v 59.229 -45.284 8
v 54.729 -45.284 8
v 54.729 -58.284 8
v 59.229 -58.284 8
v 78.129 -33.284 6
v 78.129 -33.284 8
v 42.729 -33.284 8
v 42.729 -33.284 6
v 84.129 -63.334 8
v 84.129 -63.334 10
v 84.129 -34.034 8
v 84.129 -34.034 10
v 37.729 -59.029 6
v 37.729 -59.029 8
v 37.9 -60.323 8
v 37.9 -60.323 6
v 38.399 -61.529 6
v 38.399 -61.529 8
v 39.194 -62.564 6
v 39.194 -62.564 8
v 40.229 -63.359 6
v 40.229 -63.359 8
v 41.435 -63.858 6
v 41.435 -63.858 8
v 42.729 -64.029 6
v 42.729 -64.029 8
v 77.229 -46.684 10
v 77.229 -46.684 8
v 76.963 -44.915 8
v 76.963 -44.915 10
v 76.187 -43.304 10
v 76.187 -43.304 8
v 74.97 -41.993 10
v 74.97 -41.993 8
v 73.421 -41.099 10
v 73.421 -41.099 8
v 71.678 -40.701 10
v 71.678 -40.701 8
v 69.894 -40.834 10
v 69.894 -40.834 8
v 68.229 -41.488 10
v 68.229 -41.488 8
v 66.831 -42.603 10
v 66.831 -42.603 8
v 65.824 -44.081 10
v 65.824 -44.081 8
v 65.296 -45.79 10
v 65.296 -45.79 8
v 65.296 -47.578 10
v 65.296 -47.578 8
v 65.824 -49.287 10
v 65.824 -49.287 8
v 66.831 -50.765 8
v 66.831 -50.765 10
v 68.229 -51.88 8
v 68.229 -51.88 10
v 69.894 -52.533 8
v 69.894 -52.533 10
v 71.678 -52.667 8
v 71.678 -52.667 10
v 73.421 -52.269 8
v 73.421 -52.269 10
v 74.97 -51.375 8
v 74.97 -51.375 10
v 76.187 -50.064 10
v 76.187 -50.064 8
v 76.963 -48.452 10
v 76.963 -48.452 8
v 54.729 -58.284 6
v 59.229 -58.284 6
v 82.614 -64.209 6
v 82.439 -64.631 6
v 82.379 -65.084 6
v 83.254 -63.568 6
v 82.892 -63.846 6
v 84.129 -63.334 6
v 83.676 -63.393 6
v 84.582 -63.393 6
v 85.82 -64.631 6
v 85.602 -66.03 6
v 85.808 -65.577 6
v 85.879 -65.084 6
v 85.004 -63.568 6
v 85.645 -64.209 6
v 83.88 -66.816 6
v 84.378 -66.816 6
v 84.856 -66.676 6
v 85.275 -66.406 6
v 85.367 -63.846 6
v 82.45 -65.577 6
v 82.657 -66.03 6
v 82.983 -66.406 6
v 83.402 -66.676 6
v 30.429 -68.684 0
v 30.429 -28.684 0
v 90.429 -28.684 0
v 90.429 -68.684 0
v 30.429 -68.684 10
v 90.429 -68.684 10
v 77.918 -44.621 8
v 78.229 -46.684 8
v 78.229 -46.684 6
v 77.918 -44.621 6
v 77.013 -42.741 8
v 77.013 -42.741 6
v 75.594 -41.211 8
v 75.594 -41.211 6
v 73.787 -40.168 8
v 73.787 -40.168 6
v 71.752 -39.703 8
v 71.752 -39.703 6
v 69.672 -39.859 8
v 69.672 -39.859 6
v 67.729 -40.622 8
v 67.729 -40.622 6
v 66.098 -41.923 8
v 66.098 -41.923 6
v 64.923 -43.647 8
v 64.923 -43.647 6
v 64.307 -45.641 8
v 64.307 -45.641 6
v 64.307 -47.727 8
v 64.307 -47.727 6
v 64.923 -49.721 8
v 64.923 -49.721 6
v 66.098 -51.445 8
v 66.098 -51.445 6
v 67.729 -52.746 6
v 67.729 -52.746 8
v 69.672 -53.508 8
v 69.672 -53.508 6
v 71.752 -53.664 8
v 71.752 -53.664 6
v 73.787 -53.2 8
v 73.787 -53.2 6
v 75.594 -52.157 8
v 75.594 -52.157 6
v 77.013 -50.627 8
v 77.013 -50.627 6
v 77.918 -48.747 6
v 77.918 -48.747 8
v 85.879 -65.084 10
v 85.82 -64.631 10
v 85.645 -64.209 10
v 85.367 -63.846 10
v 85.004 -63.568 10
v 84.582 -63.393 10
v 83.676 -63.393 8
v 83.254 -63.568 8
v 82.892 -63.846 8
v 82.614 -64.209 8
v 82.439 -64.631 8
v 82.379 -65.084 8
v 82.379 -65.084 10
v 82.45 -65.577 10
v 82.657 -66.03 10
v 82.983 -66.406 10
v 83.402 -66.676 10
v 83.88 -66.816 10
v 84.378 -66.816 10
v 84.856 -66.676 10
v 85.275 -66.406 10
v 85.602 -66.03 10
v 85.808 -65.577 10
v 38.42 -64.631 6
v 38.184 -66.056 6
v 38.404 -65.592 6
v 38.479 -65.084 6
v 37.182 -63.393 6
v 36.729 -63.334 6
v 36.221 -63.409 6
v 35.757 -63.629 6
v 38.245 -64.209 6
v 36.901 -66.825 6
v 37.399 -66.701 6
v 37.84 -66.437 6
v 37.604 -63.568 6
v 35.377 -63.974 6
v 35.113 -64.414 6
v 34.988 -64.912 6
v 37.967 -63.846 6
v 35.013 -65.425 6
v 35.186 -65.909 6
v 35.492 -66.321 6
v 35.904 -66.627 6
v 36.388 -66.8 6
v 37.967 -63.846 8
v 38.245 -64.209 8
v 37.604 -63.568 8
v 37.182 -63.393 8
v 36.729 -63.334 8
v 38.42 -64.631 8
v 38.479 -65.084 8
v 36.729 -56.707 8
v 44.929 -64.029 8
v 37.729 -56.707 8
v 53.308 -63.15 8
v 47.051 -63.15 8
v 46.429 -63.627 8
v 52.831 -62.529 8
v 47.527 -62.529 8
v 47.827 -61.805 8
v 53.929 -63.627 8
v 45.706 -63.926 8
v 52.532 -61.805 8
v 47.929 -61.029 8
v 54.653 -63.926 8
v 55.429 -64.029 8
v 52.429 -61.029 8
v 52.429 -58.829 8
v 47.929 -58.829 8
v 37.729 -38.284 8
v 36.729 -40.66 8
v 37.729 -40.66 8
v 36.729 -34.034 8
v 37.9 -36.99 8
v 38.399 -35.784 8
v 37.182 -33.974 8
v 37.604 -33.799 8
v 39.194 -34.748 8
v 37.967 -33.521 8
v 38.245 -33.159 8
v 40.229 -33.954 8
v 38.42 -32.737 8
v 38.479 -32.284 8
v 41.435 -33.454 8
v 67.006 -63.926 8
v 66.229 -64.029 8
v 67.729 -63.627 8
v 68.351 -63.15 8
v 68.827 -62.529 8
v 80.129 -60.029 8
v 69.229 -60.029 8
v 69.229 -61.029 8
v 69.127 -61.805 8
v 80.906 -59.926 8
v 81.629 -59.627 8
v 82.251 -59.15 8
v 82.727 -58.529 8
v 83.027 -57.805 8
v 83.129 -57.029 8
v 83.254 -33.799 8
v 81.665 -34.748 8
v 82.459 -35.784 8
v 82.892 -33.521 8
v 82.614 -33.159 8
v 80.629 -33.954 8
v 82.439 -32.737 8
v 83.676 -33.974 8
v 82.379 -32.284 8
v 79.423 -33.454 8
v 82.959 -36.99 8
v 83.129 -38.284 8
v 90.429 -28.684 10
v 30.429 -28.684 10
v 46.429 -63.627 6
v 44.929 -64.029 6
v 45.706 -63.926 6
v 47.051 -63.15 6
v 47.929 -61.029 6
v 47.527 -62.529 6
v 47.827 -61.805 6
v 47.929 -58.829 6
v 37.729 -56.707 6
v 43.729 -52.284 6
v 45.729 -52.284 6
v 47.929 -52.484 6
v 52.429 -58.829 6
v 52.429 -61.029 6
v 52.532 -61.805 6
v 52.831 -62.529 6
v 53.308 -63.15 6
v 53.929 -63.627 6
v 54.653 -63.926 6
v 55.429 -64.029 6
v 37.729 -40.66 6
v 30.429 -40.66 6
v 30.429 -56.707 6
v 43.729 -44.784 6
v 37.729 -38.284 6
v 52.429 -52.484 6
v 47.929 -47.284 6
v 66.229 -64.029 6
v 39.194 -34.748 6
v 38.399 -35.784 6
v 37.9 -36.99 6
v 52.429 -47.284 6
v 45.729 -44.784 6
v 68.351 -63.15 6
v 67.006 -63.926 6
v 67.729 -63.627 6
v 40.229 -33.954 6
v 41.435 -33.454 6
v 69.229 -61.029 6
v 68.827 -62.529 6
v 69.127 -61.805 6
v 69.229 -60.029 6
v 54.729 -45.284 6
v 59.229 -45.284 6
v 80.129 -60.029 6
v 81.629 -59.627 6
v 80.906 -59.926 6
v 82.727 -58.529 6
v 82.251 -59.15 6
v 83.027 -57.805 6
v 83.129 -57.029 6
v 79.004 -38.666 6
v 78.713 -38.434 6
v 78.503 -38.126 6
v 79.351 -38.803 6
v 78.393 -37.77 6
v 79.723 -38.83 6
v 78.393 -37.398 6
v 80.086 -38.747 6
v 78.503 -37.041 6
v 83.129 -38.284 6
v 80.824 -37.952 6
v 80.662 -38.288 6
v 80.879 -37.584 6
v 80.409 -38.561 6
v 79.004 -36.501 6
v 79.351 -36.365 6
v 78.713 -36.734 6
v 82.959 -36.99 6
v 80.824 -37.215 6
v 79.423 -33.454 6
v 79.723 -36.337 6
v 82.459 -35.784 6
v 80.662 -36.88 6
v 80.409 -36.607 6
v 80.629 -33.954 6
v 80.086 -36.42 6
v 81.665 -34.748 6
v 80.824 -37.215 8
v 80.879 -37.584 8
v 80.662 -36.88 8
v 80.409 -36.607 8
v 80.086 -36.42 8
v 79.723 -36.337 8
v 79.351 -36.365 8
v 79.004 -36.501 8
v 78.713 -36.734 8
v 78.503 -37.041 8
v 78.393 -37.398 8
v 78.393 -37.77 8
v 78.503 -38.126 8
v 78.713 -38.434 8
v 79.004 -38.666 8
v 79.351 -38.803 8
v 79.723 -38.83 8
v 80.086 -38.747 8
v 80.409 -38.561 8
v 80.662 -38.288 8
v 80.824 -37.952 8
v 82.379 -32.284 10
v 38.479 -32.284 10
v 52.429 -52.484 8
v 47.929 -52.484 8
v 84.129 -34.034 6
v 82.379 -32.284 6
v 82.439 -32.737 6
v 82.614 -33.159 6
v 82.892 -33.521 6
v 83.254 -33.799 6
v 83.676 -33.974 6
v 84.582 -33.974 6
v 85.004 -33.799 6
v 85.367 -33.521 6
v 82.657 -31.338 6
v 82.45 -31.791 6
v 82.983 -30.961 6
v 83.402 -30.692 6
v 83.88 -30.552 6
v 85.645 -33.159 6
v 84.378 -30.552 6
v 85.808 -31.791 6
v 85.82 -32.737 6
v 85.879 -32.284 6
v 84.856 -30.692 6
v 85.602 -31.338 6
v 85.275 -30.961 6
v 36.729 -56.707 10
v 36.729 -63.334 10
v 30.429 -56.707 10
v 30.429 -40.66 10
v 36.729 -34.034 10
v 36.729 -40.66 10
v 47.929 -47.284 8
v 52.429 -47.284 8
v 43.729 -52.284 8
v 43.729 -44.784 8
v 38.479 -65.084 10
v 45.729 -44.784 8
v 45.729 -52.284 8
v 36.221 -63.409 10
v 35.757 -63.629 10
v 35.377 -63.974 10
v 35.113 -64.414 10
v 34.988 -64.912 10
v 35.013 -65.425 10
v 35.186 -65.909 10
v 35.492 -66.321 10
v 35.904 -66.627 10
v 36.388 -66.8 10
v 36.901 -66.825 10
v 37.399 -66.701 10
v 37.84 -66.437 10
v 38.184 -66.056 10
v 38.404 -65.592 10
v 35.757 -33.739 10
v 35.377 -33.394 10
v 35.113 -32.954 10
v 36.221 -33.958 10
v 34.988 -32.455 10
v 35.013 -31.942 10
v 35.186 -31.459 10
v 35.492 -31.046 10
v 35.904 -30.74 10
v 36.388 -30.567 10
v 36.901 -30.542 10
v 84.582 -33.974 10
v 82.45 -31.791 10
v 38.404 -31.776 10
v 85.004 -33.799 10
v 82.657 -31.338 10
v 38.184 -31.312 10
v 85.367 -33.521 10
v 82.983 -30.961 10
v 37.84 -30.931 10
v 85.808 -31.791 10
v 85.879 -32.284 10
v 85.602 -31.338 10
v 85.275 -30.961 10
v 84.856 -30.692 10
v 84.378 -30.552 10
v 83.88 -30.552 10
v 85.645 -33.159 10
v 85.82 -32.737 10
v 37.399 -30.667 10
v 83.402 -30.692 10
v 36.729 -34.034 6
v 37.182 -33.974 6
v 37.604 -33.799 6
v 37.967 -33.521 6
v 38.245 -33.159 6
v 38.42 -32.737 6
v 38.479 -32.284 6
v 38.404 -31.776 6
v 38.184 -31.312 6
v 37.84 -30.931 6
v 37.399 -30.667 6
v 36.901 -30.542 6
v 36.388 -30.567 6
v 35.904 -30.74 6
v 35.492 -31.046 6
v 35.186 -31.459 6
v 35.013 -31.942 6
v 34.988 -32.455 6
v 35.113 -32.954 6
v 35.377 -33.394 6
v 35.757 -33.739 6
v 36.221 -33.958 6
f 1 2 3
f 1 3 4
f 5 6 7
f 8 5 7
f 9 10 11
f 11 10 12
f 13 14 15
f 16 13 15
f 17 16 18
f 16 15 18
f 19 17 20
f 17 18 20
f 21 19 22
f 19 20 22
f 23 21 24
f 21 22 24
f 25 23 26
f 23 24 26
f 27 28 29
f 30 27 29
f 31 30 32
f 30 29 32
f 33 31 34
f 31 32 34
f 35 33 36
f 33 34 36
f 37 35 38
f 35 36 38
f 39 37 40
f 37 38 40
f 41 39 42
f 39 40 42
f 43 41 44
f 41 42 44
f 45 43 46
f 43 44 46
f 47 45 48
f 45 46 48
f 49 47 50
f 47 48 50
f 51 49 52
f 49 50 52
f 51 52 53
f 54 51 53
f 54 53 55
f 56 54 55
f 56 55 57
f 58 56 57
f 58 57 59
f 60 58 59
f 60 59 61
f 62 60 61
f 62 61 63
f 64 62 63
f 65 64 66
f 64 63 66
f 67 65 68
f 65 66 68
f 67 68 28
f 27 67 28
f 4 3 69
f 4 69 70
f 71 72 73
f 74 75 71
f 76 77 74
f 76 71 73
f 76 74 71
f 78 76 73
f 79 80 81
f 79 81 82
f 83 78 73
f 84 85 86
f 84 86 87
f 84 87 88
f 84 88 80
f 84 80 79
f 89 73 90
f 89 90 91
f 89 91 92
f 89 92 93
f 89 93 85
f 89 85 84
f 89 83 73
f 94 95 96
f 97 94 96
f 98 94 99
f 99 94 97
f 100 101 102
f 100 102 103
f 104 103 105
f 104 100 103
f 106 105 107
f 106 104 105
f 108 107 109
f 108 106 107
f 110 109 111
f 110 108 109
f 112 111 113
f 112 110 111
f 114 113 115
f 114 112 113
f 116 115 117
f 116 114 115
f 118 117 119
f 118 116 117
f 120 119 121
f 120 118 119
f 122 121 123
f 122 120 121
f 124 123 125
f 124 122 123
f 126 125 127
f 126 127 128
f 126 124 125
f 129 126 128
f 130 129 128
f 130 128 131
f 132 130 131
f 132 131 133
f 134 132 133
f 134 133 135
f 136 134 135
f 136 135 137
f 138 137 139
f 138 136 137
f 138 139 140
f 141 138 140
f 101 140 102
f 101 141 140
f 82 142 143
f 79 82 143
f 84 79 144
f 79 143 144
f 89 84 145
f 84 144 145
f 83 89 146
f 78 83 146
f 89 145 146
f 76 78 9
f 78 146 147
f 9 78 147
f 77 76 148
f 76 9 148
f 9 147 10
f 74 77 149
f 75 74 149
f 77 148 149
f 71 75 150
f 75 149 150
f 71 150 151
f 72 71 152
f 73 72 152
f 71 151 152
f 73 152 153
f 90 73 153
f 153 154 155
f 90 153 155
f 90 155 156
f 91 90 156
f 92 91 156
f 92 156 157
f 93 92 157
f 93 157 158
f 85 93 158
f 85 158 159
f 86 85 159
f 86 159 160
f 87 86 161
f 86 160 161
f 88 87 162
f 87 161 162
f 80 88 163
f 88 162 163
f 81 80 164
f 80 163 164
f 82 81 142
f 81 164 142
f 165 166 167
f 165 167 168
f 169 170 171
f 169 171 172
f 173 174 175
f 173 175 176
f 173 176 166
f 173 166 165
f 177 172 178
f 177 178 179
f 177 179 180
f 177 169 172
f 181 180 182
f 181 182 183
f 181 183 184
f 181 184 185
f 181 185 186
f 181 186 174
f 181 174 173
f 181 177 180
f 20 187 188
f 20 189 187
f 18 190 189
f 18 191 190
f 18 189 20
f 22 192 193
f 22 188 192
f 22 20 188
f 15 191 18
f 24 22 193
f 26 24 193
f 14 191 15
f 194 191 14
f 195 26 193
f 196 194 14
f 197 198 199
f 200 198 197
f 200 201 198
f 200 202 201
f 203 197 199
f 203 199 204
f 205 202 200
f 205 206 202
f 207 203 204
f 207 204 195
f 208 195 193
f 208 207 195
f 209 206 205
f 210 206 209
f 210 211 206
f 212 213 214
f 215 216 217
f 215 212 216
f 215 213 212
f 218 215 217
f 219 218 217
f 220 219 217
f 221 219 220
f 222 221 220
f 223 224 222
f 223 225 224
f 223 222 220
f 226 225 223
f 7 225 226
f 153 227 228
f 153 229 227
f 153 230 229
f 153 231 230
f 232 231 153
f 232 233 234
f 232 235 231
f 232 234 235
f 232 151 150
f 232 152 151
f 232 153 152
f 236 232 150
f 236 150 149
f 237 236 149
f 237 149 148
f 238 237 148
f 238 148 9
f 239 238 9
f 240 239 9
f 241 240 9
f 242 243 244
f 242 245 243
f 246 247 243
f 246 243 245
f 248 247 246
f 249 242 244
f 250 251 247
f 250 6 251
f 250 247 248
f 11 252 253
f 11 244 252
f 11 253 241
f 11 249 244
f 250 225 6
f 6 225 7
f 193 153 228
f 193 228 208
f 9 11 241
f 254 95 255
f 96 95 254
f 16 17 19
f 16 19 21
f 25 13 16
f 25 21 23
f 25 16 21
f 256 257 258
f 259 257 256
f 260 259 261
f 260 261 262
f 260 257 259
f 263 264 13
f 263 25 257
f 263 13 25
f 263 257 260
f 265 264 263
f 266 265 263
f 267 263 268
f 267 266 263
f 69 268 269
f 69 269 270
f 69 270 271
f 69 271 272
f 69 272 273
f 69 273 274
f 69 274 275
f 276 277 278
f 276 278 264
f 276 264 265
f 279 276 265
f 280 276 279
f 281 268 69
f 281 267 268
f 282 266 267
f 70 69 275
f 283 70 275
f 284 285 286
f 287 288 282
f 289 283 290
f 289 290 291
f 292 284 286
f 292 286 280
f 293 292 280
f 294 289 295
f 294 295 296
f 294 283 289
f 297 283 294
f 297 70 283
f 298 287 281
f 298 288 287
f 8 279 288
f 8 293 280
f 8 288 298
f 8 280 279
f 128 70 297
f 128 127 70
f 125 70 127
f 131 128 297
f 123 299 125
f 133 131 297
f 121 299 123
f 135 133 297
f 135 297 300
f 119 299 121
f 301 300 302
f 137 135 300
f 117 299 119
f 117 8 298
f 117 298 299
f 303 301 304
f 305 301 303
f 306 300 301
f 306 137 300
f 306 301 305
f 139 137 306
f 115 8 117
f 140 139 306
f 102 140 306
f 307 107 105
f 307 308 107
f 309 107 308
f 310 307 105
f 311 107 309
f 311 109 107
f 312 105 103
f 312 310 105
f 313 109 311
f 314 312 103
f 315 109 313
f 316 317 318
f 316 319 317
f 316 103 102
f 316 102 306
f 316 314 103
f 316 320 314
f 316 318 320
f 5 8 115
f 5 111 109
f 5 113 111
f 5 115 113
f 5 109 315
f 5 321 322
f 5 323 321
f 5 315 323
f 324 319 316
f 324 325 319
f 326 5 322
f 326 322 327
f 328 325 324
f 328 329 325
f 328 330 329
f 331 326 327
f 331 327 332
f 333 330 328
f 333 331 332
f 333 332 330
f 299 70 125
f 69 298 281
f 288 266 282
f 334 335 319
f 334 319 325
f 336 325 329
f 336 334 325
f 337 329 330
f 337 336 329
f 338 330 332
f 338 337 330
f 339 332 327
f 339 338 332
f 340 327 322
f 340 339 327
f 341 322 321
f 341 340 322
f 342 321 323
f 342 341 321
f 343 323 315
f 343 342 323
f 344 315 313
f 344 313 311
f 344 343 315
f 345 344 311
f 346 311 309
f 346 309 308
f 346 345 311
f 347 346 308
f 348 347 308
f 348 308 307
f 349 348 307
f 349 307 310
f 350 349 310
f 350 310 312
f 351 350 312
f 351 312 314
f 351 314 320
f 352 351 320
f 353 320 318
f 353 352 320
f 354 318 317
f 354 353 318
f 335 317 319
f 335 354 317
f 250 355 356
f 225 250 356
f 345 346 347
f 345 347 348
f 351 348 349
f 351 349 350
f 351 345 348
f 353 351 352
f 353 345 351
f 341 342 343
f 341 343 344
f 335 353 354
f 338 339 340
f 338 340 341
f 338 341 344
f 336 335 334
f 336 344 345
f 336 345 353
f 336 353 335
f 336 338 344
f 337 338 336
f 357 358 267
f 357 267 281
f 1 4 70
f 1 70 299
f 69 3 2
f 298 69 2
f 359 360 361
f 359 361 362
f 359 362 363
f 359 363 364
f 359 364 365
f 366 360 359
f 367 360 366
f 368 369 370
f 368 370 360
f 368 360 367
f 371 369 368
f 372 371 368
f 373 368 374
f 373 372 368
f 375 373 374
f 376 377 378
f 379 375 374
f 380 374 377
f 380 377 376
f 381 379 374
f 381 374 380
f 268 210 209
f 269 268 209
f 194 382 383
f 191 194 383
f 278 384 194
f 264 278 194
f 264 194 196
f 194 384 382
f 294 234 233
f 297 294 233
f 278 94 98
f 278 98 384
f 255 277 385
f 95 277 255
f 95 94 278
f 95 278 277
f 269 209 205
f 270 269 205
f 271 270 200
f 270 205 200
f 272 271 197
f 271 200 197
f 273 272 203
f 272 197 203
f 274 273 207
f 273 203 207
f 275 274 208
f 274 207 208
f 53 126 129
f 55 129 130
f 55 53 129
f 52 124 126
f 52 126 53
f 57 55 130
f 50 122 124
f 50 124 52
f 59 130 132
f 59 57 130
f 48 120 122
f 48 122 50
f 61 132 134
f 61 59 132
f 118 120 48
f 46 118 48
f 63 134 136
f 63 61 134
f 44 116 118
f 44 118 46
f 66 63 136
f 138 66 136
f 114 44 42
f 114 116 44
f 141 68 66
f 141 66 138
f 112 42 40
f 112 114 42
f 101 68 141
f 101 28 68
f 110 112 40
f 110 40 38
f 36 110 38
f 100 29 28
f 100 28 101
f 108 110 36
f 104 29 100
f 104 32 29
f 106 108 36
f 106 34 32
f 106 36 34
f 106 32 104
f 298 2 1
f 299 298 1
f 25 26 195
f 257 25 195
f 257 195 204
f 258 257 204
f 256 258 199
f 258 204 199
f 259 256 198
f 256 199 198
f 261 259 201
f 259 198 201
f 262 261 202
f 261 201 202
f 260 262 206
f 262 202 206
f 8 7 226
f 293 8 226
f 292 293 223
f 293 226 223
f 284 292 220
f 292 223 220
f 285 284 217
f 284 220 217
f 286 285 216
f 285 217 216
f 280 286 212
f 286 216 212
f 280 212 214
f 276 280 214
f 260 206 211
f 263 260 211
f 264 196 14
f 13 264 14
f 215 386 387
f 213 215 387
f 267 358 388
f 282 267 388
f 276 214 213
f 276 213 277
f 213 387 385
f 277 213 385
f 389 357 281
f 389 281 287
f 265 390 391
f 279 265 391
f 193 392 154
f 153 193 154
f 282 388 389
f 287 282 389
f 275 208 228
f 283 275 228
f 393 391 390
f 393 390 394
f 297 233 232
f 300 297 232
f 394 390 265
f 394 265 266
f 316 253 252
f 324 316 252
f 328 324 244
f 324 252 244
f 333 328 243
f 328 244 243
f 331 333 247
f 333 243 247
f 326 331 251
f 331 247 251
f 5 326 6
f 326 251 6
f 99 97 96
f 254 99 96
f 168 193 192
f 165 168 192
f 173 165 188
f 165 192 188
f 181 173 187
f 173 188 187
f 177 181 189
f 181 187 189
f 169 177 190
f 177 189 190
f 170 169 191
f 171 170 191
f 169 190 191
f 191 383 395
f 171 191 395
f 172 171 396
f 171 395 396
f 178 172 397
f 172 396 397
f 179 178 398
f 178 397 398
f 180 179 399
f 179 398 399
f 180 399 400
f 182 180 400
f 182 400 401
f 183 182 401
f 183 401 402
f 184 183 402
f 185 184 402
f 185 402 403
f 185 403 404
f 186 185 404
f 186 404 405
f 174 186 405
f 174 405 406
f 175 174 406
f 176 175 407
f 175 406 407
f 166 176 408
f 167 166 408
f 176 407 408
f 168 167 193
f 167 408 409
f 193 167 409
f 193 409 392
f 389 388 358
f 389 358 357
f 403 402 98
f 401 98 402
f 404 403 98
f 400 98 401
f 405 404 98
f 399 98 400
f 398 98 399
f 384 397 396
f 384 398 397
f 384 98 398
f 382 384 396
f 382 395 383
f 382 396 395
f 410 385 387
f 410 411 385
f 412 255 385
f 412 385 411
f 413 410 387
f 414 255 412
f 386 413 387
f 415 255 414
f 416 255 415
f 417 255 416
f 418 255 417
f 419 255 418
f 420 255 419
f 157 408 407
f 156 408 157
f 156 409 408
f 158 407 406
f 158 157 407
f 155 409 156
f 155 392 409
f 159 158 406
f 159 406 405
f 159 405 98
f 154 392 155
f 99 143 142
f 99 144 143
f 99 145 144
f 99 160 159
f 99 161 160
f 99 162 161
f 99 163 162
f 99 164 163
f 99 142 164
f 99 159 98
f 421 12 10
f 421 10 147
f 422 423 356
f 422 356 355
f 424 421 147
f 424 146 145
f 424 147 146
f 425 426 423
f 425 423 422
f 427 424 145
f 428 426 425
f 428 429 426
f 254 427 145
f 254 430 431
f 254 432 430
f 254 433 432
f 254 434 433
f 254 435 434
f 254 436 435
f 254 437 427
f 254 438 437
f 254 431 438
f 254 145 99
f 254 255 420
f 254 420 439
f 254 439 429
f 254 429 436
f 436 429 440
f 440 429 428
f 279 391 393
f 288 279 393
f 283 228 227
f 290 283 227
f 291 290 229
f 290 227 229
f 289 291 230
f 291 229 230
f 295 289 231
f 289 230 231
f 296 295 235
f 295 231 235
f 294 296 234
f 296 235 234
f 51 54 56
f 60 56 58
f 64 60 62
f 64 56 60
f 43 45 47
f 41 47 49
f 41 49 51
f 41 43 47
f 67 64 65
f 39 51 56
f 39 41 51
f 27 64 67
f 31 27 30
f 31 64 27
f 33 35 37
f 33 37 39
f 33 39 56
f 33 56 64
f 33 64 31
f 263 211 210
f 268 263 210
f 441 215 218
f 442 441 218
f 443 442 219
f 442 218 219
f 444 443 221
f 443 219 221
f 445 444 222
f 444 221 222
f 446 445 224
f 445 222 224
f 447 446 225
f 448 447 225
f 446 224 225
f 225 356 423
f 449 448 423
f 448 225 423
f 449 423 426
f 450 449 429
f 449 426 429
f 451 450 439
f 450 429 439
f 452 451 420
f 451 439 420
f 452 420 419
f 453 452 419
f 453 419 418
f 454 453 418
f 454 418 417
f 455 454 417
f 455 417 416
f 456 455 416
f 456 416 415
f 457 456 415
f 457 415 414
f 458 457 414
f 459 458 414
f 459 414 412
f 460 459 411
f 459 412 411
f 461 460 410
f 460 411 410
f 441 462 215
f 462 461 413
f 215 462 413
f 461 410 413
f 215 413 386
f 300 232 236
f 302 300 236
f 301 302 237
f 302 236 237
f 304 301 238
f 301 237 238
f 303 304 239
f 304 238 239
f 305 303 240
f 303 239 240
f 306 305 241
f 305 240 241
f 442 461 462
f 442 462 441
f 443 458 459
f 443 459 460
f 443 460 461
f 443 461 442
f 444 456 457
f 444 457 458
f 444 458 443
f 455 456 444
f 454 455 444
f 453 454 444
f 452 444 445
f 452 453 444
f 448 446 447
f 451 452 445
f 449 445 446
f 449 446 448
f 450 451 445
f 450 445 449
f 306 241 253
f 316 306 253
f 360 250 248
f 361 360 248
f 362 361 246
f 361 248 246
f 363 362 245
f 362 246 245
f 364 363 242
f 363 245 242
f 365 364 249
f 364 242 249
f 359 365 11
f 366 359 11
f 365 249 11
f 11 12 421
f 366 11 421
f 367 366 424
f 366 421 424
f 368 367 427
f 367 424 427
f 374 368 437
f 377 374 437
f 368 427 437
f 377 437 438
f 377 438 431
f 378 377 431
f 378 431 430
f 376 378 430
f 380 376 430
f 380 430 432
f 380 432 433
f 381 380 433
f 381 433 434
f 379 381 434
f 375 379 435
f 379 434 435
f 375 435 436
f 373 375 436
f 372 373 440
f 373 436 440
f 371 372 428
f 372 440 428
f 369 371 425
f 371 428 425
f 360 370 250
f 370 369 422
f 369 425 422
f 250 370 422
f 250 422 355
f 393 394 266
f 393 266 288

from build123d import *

# Parameters (mm, degrees)
F0_W     = 60
F0_H     = 40
F1_DEPTH = 10
F3_DEPTH = 2
F5_DEPTH = 4
F4_R     = 6
F6_DEPTH = 2
F2_W     = 6.3
F2_H     = 16.0467466712
F2_W_2   = 1.9639990747
F7_DEPTH = 4
F4_W     = 4.5
F4_H     = 5.2
F4_H_2   = 13
F4_W_2   = 2
F4_H_3   = 7.5
F4_R_2   = 7
F4_R_3   = 1.25
F8_DEPTH = 2


with BuildPart() as f1:
    # F0 (on Top) → F1 (new body)
    with BuildSketch(Plane.XY):
        with Locations((60.4293134809, -48.683847785)):
            Rectangle(F0_W, F0_H)
    extrude(amount=F1_DEPTH)

    # F2 (on face) → F3 (cut)
    with BuildSketch(Plane.XY.offset(10)):
        with BuildLine():
            Line((38.4793134809, -32.283847785), (36.7293134809, -32.283847785))
            Line((36.7293134809, -32.283847785), (36.7293134809, -34.033847785))
            ThreePointArc((36.7293134809, -34.033847785), (37.9667503479, -33.5212846521), (38.4793134809, -32.283847785))
        make_face()
        with BuildLine():
            Line((36.7293134809, -34.033847785), (36.7293134809, -32.283847785))
            Line((36.7293134809, -32.283847785), (38.4793134809, -32.283847785))
            ThreePointArc((38.4793134809, -32.283847785), (35.4918766138, -31.0464109179), (36.7293134809, -34.033847785))
        make_face()
        with BuildLine():
            ThreePointArc((38.4793134809, -65.083847785), (37.9667503479, -63.8464109179), (36.7293134809, -63.333847785))
            Line((36.7293134809, -63.333847785), (36.7293134809, -65.083847785))
            Line((36.7293134809, -65.083847785), (38.4793134809, -65.083847785))
        make_face()
        with BuildLine():
            Line((36.7293134809, -65.083847785), (36.7293134809, -63.333847785))
            ThreePointArc((36.7293134809, -63.333847785), (35.4918766138, -66.3212846521), (38.4793134809, -65.083847785))
            Line((38.4793134809, -65.083847785), (36.7293134809, -65.083847785))
        make_face()
        with BuildLine():
            ThreePointArc((85.8793134809, -65.083847785), (85.3667503479, -63.8464109179), (84.1293134809, -63.333847785))
            Line((84.1293134809, -63.333847785), (84.1293134809, -65.083847785))
            Line((84.1293134809, -65.083847785), (82.3793134809, -65.083847785))
            ThreePointArc((82.3793134809, -65.083847785), (84.1293134809, -66.833847785), (85.8793134809, -65.083847785))
        make_face()
        with BuildLine():
            Line((84.1293134809, -65.083847785), (84.1293134809, -63.333847785))
            ThreePointArc((84.1293134809, -63.333847785), (82.8918766138, -63.8464109179), (82.3793134809, -65.083847785))
            Line((82.3793134809, -65.083847785), (84.1293134809, -65.083847785))
        make_face()
        with BuildLine():
            Line((82.3793134809, -32.283847785), (38.4793134809, -32.283847785))
            ThreePointArc((38.4793134809, -32.283847785), (37.9667503479, -33.5212846521), (36.7293134809, -34.033847785))
            Line((36.7293134809, -34.033847785), (36.7293134809, -40.6604744494))
            Line((36.7293134809, -40.6604744494), (38.6933125556, -40.6604744494))
            Line((38.6933125556, -40.6604744494), (38.6933125556, -56.7072211206))
            Line((38.6933125556, -56.7072211206), (36.7293134809, -56.7072211206))
            Line((36.7293134809, -56.7072211206), (36.7293134809, -63.333847785))
            ThreePointArc((36.7293134809, -63.333847785), (37.9667503479, -63.8464109179), (38.4793134809, -65.083847785))
            Line((38.4793134809, -65.083847785), (82.3793134809, -65.083847785))
            ThreePointArc((82.3793134809, -65.083847785), (82.8918766138, -63.8464109179), (84.1293134809, -63.333847785))
            Line((84.1293134809, -63.333847785), (84.1293134809, -34.033847785))
            ThreePointArc((84.1293134809, -34.033847785), (82.8918766138, -33.5212846521), (82.3793134809, -32.283847785))
        make_face()
        with BuildLine():
            Line((84.1293134809, -32.283847785), (82.3793134809, -32.283847785))
            ThreePointArc((82.3793134809, -32.283847785), (82.8918766138, -33.5212846521), (84.1293134809, -34.033847785))
            Line((84.1293134809, -34.033847785), (84.1293134809, -32.283847785))
        make_face()
        with BuildLine():
            ThreePointArc((85.8793134809, -32.283847785), (84.1293134809, -30.533847785), (82.3793134809, -32.283847785))
            Line((82.3793134809, -32.283847785), (84.1293134809, -32.283847785))
            Line((84.1293134809, -32.283847785), (84.1293134809, -34.033847785))
            ThreePointArc((84.1293134809, -34.033847785), (85.3667503479, -33.5212846521), (85.8793134809, -32.283847785))
        make_face()
    extrude(amount=-F3_DEPTH, mode=Mode.SUBTRACT)

    # F2 (on face) → F5 (cut)
    with BuildSketch(Plane.XY.offset(10)):
        with BuildLine():
            Line((38.4793134809, -32.283847785), (36.7293134809, -32.283847785))
            Line((36.7293134809, -32.283847785), (36.7293134809, -34.033847785))
            ThreePointArc((36.7293134809, -34.033847785), (37.9667503479, -33.5212846521), (38.4793134809, -32.283847785))
        make_face()
        with BuildLine():
            Line((36.7293134809, -34.033847785), (36.7293134809, -32.283847785))
            Line((36.7293134809, -32.283847785), (38.4793134809, -32.283847785))
            ThreePointArc((38.4793134809, -32.283847785), (35.4918766138, -31.0464109179), (36.7293134809, -34.033847785))
        make_face()
        with BuildLine():
            ThreePointArc((38.4793134809, -65.083847785), (37.9667503479, -63.8464109179), (36.7293134809, -63.333847785))
            Line((36.7293134809, -63.333847785), (36.7293134809, -65.083847785))
            Line((36.7293134809, -65.083847785), (38.4793134809, -65.083847785))
        make_face()
        with BuildLine():
            Line((36.7293134809, -65.083847785), (36.7293134809, -63.333847785))
            ThreePointArc((36.7293134809, -63.333847785), (35.4918766138, -66.3212846521), (38.4793134809, -65.083847785))
            Line((38.4793134809, -65.083847785), (36.7293134809, -65.083847785))
        make_face()
        with BuildLine():
            Line((84.1293134809, -32.283847785), (82.3793134809, -32.283847785))
            ThreePointArc((82.3793134809, -32.283847785), (82.8918766138, -33.5212846521), (84.1293134809, -34.033847785))
            Line((84.1293134809, -34.033847785), (84.1293134809, -32.283847785))
        make_face()
        with BuildLine():
            ThreePointArc((85.8793134809, -32.283847785), (84.1293134809, -30.533847785), (82.3793134809, -32.283847785))
            Line((82.3793134809, -32.283847785), (84.1293134809, -32.283847785))
            Line((84.1293134809, -32.283847785), (84.1293134809, -34.033847785))
            ThreePointArc((84.1293134809, -34.033847785), (85.3667503479, -33.5212846521), (85.8793134809, -32.283847785))
        make_face()
        with BuildLine():
            Line((84.1293134809, -65.083847785), (84.1293134809, -63.333847785))
            ThreePointArc((84.1293134809, -63.333847785), (82.8918766138, -63.8464109179), (82.3793134809, -65.083847785))
            Line((82.3793134809, -65.083847785), (84.1293134809, -65.083847785))
        make_face()
        with BuildLine():
            ThreePointArc((85.8793134809, -65.083847785), (85.3667503479, -63.8464109179), (84.1293134809, -63.333847785))
            Line((84.1293134809, -63.333847785), (84.1293134809, -65.083847785))
            Line((84.1293134809, -65.083847785), (82.3793134809, -65.083847785))
            ThreePointArc((82.3793134809, -65.083847785), (84.1293134809, -66.833847785), (85.8793134809, -65.083847785))
        make_face()
    extrude(amount=-F5_DEPTH, mode=Mode.SUBTRACT)

    # F4 (on face) → F6 (join)
    with BuildSketch(Plane.XY.offset(8)):
        with Locations((71.2293134809, -46.683847785)):
            Circle(F4_R)
    extrude(amount=F6_DEPTH)

    # F2 (on face) → F7 (cut)
    with BuildSketch(Plane.XY.offset(10)):
        with Locations((33.5793134809, -48.683847785)):
            Rectangle(F2_W, F2_H)
        with Locations((37.7113130182, -48.683847785)):
            Rectangle(F2_W_2, F2_H)
    extrude(amount=-F7_DEPTH, mode=Mode.SUBTRACT)

    # F4 (on face) → F8 (cut)
    with BuildSketch(Plane.XY.offset(8)):
        with BuildLine():
            Line((78.1293134809, -33.283847785), (42.7293134809, -33.283847785))
            ThreePointArc((42.7293134809, -33.283847785), (39.1937795749, -34.7483138791), (37.7293134809, -38.283847785))
            Line((37.7293134809, -38.283847785), (37.7293134809, -40.6604744494))
            Line((37.7293134809, -40.6604744494), (38.6933125556, -40.6604744494))
            Line((38.6933125556, -40.6604744494), (38.6933125556, -56.7072211206))
            Line((38.6933125556, -56.7072211206), (37.7293134809, -56.7072211206))
            Line((37.7293134809, -56.7072211206), (37.7293134809, -59.028696239))
            ThreePointArc((37.7293134809, -59.028696239), (39.1937795749, -62.5642301449), (42.7293134809, -64.028696239))
            Line((42.7293134809, -64.028696239), (44.9293134809, -64.028696239))
            ThreePointArc((44.9293134809, -64.028696239), (47.0506338244, -63.1500165826), (47.9293134809, -61.028696239))
            Line((47.9293134809, -61.028696239), (47.9293134809, -58.828696239))
            Line((47.9293134809, -58.828696239), (52.4293134809, -58.828696239))
            Line((52.4293134809, -58.828696239), (52.4293134809, -61.028696239))
            ThreePointArc((52.4293134809, -61.028696239), (53.3079931373, -63.1500165826), (55.4293134809, -64.028696239))
            Line((55.4293134809, -64.028696239), (66.2293134809, -64.028696239))
            ThreePointArc((66.2293134809, -64.028696239), (68.3506338244, -63.1500165826), (69.2293134809, -61.028696239))
            Line((69.2293134809, -61.028696239), (69.2293134809, -60.028696239))
            Line((69.2293134809, -60.028696239), (80.1293134809, -60.028696239))
            ThreePointArc((80.1293134809, -60.028696239), (82.2506338244, -59.1500165826), (83.1293134809, -57.028696239))
            Line((83.1293134809, -57.028696239), (83.1293134809, -38.283847785))
            ThreePointArc((83.1293134809, -38.283847785), (81.6648473868, -34.7483138791), (78.1293134809, -33.283847785))
        make_face()
        with Locations((50.1793134809, -49.883847785)):
            Rectangle(F4_W, F4_H, mode=Mode.SUBTRACT)
        with Locations((56.9793134809, -51.783847785)):
            Rectangle(F4_W, F4_H_2, mode=Mode.SUBTRACT)
        with Locations((44.7293134809, -48.533847785)):
            Rectangle(F4_W_2, F4_H_3, mode=Mode.SUBTRACT)
        with Locations((71.2293134809, -46.683847785)):
            Circle(F4_R_2, mode=Mode.SUBTRACT)
        with Locations((79.6293134809, -37.583847785)):
            Circle(F4_R_3, mode=Mode.SUBTRACT)
    extrude(amount=-F8_DEPTH, mode=Mode.SUBTRACT)


solid = f1.part
